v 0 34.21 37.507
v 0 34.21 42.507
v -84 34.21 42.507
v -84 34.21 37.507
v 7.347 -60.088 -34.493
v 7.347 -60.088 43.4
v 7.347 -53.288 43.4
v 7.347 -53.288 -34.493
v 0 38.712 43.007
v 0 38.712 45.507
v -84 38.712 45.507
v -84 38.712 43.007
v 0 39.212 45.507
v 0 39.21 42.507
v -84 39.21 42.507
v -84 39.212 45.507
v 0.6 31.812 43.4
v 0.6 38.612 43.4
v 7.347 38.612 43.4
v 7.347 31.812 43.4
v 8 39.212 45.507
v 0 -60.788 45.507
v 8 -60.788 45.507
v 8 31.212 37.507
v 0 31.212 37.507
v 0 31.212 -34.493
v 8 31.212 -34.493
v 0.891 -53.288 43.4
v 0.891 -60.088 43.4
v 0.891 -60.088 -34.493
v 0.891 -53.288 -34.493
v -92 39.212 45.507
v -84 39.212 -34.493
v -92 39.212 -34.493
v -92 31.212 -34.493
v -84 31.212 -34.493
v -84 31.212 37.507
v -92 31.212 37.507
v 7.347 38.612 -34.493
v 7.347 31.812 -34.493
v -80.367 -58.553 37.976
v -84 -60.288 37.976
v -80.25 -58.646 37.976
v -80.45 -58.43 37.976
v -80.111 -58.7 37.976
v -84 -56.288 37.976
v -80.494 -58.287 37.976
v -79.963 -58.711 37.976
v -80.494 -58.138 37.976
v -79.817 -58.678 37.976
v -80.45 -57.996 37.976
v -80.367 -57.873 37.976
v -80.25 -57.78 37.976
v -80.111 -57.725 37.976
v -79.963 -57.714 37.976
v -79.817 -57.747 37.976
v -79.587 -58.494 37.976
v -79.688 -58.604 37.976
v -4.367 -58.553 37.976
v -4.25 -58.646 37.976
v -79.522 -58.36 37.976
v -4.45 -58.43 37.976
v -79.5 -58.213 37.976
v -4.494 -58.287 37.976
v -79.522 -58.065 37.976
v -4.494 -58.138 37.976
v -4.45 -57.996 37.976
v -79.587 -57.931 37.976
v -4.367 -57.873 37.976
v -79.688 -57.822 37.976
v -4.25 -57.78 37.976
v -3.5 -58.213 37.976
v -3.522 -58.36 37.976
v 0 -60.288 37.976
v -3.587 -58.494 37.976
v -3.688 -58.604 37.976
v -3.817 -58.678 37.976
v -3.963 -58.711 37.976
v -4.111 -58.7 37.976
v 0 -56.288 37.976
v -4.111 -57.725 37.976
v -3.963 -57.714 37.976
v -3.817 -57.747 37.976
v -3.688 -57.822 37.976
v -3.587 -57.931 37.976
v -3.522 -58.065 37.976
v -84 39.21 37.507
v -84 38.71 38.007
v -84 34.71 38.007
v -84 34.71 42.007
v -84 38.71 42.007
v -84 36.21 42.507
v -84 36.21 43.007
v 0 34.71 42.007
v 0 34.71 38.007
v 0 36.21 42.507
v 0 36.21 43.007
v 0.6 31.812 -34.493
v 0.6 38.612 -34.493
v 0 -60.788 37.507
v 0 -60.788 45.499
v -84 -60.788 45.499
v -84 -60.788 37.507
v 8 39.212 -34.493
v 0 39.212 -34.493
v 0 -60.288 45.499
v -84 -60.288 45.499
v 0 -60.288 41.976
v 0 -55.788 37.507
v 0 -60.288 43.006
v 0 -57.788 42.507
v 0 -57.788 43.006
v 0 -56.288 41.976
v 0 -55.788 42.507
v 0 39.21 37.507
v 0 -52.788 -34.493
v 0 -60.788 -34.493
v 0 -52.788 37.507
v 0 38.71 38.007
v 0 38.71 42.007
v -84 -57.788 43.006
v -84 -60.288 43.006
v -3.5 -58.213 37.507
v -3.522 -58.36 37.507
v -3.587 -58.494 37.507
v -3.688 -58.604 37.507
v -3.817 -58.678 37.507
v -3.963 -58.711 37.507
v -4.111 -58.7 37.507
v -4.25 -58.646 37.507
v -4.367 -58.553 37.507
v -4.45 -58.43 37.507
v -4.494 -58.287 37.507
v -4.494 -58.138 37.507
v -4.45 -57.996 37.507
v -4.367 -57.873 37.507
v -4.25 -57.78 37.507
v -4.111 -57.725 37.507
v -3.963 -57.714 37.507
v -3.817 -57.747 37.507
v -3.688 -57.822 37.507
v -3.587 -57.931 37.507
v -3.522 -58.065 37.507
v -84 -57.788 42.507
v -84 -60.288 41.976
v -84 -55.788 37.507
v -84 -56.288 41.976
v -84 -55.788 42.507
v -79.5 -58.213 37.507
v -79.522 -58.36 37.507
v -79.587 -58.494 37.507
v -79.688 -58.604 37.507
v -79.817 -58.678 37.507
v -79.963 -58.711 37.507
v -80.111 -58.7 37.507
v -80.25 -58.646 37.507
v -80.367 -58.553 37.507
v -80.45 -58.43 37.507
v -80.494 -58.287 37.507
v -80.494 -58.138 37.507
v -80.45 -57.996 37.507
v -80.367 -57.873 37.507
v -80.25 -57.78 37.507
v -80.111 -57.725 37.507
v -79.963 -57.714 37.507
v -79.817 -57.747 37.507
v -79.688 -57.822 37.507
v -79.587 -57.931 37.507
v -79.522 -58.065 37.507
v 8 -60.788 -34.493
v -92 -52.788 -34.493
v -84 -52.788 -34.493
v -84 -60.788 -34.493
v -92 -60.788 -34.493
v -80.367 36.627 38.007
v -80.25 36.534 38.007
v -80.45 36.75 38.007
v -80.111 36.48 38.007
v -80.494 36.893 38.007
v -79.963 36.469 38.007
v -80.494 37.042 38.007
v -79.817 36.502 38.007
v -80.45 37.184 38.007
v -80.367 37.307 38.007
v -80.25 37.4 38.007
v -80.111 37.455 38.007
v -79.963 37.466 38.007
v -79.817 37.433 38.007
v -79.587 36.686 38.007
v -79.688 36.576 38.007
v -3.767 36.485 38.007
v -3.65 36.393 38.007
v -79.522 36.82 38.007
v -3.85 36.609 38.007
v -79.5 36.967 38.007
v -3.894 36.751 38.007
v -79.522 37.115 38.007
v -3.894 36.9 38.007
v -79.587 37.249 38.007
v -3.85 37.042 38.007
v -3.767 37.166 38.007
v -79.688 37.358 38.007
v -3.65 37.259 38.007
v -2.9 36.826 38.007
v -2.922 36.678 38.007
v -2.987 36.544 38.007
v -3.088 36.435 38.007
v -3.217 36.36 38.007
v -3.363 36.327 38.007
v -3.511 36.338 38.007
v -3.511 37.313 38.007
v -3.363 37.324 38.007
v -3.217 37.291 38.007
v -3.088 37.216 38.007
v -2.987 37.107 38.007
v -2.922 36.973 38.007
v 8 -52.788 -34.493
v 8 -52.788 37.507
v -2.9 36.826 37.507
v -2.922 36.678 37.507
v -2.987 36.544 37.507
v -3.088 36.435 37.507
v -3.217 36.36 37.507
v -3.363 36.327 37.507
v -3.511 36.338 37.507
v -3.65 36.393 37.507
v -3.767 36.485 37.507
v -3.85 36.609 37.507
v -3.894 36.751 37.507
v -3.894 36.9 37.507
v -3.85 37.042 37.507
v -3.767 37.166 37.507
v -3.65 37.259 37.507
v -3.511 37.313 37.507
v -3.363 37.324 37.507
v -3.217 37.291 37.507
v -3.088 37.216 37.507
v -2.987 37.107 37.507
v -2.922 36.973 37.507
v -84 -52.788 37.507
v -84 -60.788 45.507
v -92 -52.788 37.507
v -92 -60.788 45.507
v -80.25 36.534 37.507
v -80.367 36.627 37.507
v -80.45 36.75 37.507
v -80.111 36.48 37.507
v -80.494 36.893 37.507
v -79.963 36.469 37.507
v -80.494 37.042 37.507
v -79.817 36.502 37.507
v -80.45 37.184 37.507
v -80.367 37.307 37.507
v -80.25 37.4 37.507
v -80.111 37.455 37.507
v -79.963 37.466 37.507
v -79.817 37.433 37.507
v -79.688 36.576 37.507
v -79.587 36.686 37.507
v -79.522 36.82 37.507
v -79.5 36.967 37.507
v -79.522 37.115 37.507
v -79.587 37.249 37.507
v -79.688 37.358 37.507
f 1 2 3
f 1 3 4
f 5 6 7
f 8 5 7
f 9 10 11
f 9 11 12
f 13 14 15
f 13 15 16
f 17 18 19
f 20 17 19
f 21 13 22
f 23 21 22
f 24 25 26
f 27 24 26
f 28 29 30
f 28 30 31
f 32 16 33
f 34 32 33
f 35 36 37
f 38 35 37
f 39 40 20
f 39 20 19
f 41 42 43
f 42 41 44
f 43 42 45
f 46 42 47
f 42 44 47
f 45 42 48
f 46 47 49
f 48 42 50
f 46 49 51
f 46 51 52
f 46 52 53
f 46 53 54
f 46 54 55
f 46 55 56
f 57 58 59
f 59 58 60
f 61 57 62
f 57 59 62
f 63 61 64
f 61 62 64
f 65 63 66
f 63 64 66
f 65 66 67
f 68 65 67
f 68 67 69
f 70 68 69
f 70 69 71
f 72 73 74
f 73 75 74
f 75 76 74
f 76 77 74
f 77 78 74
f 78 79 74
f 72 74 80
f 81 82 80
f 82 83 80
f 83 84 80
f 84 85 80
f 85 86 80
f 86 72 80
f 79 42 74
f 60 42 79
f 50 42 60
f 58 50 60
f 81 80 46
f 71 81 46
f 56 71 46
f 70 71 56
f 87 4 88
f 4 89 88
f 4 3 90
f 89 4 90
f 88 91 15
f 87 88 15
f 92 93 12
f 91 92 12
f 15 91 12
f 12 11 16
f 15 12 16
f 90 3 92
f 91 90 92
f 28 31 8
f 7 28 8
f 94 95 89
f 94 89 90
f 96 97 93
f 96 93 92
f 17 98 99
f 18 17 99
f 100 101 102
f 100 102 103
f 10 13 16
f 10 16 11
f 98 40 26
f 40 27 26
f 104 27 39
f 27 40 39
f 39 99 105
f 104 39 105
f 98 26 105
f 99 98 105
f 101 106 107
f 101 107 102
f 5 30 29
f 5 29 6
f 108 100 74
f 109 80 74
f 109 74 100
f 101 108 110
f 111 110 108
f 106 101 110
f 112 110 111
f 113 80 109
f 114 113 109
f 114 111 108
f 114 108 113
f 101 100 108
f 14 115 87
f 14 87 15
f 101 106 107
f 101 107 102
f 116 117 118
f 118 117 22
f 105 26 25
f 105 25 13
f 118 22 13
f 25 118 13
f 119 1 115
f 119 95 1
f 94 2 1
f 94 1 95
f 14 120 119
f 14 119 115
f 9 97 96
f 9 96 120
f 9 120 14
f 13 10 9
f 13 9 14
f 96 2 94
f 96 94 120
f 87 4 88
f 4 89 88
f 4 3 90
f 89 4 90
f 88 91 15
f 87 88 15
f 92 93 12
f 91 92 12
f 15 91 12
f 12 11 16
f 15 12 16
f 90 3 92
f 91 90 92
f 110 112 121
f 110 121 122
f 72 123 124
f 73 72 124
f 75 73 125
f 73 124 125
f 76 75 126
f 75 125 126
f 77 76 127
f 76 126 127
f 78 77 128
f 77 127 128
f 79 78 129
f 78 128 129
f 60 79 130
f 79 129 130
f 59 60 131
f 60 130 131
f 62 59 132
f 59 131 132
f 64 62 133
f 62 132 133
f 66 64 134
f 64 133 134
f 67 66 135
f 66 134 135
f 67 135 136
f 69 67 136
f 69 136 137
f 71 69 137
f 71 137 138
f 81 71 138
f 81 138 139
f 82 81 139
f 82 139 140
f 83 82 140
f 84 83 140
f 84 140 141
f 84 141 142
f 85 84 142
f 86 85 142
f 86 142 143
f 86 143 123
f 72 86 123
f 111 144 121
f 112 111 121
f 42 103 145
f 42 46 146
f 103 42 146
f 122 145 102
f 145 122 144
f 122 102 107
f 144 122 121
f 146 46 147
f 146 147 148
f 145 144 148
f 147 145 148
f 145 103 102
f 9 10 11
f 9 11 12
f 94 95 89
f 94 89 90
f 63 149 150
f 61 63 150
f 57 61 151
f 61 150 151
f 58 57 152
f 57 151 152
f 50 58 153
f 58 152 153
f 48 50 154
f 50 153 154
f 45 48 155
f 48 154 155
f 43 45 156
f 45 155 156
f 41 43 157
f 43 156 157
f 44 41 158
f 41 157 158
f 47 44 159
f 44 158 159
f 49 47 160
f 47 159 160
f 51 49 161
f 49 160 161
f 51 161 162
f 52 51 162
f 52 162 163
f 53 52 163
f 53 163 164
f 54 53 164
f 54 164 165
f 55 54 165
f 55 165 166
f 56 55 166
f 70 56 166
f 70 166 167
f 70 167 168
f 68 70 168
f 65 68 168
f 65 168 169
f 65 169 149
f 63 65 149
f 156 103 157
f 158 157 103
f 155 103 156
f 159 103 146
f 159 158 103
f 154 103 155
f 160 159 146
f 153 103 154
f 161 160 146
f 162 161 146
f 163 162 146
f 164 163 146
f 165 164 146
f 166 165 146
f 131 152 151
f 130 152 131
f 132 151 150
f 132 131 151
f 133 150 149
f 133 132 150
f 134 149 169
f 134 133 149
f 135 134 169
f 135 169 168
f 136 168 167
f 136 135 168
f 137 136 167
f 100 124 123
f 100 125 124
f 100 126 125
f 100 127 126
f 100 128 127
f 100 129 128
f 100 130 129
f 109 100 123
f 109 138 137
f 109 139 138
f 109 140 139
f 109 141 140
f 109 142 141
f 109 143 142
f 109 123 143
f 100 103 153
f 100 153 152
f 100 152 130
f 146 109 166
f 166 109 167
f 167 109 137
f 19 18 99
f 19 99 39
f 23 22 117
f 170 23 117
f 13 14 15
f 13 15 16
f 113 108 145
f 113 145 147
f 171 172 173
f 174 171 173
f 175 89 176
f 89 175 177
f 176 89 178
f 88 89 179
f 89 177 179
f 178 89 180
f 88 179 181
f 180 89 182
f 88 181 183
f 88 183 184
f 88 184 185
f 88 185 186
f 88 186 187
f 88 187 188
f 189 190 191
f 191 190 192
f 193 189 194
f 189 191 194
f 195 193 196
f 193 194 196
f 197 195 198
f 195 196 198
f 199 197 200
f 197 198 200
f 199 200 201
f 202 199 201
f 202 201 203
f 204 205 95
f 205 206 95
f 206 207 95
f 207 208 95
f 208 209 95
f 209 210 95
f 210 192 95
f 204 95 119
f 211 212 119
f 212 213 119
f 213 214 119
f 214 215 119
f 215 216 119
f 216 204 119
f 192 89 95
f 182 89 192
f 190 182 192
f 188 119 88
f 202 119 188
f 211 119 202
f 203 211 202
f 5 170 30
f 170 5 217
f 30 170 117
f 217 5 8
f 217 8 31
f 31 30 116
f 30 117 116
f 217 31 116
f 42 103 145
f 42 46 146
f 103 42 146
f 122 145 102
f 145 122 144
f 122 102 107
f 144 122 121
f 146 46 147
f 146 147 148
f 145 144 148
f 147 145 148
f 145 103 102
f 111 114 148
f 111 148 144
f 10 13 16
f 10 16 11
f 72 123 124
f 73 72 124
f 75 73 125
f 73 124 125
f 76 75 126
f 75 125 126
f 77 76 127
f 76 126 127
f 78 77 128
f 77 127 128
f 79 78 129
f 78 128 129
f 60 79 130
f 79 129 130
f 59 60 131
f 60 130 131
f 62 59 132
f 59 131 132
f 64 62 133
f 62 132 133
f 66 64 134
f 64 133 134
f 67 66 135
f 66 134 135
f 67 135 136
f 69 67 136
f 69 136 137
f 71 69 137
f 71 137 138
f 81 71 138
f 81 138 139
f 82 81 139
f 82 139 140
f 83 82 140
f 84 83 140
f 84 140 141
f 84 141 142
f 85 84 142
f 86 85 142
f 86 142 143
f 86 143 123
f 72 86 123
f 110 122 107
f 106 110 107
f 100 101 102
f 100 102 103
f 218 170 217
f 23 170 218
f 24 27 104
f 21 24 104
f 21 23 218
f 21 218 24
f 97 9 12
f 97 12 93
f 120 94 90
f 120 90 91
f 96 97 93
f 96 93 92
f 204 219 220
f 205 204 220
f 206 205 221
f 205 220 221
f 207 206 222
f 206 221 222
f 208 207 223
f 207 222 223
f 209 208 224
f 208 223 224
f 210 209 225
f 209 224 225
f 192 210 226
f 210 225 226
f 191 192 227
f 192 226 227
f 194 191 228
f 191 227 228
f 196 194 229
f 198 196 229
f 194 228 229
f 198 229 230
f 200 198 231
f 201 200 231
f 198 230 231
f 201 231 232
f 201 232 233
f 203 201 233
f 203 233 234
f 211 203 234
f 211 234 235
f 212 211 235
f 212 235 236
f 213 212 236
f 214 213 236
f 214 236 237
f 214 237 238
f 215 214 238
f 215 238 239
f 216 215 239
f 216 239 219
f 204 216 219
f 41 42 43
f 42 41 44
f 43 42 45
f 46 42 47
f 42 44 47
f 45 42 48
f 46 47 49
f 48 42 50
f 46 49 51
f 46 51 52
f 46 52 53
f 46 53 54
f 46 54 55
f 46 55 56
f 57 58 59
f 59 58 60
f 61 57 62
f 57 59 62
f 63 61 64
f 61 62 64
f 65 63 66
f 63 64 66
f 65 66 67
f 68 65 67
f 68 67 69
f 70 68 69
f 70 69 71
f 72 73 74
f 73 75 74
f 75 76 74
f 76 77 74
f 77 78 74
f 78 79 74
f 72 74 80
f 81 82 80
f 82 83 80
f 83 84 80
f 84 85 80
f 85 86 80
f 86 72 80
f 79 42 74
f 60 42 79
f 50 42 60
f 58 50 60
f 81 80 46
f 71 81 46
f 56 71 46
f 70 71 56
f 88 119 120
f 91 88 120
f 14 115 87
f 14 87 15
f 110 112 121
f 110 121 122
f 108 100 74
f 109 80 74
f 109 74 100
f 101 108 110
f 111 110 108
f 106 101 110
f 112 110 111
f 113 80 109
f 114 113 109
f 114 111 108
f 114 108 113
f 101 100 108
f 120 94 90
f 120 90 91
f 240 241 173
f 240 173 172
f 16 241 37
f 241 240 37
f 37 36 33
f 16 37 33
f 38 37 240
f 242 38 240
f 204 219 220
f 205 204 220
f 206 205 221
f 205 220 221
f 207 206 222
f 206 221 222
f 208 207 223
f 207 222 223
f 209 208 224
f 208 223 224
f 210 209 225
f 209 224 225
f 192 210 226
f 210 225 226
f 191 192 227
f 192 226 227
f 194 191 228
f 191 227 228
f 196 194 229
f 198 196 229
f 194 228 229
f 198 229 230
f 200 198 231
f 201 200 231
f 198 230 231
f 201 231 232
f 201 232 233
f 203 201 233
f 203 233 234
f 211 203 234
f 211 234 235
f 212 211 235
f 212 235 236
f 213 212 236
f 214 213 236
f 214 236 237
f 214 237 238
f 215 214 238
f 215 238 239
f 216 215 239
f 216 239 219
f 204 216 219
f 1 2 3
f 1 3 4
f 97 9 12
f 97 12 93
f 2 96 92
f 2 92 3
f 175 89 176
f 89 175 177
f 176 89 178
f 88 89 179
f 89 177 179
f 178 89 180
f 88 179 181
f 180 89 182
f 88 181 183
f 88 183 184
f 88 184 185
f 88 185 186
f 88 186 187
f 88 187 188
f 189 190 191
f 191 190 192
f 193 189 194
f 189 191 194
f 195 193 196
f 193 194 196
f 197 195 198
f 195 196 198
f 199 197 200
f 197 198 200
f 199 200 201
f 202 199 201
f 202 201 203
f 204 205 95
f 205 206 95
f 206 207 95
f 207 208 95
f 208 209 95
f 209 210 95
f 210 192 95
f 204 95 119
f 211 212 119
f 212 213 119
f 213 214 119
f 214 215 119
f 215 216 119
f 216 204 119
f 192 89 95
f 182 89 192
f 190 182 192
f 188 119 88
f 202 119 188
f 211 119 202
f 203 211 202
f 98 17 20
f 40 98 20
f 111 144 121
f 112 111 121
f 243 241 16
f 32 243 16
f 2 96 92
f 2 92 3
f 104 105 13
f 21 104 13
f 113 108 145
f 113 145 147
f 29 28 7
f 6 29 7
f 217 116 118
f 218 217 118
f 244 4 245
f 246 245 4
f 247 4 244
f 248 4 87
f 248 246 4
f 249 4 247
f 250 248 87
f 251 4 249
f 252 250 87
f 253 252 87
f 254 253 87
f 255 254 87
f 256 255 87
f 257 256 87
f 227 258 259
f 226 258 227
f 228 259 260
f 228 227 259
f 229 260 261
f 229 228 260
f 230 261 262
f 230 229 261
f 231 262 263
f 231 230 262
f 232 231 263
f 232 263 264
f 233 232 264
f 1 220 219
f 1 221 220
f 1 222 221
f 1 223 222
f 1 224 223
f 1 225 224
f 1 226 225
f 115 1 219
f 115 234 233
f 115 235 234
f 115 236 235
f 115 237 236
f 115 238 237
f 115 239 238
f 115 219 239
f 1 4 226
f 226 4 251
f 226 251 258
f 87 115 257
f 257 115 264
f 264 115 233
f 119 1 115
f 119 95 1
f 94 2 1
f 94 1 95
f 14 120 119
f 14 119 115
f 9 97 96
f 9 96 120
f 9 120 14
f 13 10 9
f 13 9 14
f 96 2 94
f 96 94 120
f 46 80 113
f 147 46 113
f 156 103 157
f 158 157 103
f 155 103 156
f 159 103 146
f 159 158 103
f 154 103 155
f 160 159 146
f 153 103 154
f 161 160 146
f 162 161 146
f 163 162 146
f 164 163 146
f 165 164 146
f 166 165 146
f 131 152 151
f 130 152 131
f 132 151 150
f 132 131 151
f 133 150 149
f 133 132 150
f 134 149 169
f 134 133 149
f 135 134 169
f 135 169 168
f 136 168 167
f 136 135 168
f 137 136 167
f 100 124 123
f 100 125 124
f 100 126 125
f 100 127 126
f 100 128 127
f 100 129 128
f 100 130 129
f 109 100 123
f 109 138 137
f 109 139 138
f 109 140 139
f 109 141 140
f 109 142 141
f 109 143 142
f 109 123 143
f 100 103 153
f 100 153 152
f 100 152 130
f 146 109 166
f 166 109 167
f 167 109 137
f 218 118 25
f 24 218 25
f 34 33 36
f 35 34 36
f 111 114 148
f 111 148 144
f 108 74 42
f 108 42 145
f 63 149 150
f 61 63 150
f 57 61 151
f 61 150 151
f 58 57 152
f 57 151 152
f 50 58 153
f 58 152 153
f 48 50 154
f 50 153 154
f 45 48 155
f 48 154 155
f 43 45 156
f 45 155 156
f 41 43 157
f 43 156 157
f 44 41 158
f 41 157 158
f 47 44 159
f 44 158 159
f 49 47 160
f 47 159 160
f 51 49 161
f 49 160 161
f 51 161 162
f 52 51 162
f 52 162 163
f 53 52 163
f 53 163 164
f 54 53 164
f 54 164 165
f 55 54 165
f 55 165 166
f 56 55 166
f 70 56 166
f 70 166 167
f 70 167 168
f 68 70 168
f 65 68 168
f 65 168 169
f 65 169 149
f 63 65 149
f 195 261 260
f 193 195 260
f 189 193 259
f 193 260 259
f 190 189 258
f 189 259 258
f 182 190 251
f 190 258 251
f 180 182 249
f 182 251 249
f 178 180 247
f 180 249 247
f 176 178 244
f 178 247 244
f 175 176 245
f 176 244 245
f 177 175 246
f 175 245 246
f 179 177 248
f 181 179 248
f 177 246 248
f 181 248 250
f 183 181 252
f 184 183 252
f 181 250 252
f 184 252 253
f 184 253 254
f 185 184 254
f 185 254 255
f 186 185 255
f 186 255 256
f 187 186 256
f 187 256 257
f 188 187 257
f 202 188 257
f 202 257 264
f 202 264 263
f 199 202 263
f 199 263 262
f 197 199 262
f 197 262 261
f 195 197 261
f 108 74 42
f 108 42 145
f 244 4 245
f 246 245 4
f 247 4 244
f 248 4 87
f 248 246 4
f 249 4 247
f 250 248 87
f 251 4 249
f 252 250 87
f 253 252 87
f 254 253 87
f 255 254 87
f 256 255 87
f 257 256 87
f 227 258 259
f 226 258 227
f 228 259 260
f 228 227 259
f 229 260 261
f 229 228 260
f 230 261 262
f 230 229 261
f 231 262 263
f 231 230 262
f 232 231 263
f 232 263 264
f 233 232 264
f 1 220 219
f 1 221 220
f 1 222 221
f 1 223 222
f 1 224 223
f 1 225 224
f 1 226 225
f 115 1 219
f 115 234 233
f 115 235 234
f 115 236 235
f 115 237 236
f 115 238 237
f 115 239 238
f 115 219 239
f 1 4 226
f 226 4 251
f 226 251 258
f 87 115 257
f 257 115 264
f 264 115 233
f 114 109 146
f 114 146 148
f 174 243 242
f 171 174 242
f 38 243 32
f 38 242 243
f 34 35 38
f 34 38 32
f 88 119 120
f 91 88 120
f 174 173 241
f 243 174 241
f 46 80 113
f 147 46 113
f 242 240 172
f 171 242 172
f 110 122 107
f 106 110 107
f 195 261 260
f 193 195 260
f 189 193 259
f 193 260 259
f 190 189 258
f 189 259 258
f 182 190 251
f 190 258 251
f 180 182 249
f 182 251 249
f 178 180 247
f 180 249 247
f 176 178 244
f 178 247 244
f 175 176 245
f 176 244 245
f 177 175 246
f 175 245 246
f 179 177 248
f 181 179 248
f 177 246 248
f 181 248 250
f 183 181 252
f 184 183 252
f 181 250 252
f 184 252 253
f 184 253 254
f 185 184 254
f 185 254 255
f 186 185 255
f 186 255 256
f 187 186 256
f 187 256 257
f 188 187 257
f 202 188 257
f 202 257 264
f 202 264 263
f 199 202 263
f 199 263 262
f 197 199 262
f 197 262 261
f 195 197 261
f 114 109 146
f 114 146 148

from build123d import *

# Parameters (mm, degrees)
F1_DEPTH = 8
F2_W     = 6.4551721394
F2_H     = 6.8
F2_W_2   = 6.7465151047
F3_DEPTH = 43.4
F4_W     = 4
F4_H     = 4
F5_DEPTH = 84
F6_DEPTH = 84
F7_START = 84
F7_DEPTH = 8
F8_R     = 0.5
F9_DEPTH = 4.1


with BuildPart() as f1:
    # F0 (on Right) → F1 (new body)
    with BuildSketch(Plane.YZ):
        Polygon((-60.7876732945, 45.5071360877), (-60.7876732945, -34.4928639123), (-52.7876732945, -34.4928639123), (-52.7876732945, 37.5071360877), (31.2123267055, 37.5071360877), (31.2123267055, -34.4928639123), (39.2123267055, -34.4928639123), (39.2123267055, 45.5071360877), align=None)
    extrude(amount=F1_DEPTH)

    # F2 (on Top) → F3 (cut, symmetric)
    with BuildSketch(Plane.XY):
        with Locations((4.118929035, -56.6876732945)):
            Rectangle(F2_W, F2_H)
        with Locations((3.9732575524, 35.2123267055)):
            Rectangle(F2_W_2, F2_H)
    extrude(amount=F3_DEPTH, both=True, mode=Mode.SUBTRACT)


with BuildPart() as f5:
    # F4 (on Right) → F5 (new body)
    with BuildSketch(Plane.YZ):
        Polygon((39.2096609688, 37.5071360877), (39.2096609688, 42.5071360877), (36.2096609688, 42.5071360877), (34.2096609688, 42.5071360877), (34.2096609688, 37.5071360877), align=None)
        with Locations((36.7096609688, 40.0071360877)):
            Rectangle(F4_W, F4_H, mode=Mode.SUBTRACT)
        Polygon((36.2096609688, 42.5071360877), (39.2096609688, 42.5071360877), (39.2123267055, 45.5071349033), (38.7123267055, 45.5071349033), (38.7123267055, 43.0071360877), (36.2096609688, 43.0071360877), align=None)
    extrude(amount=-F5_DEPTH)


with BuildPart() as f5b:
    # F4 (on Right) → F5, piece 2 (new body)
    with BuildSketch(Plane.YZ):
        Polygon((-55.7876732945, 37.5071360877), (-55.7876732945, 42.5071360877), (-57.7876734523, 42.5071360877), (-57.7876734523, 42.5061632327), (-60.7876732945, 42.5071360877), (-60.7876732945, 37.5071360877), align=None)
        with Locations((-58.2876732945, 39.9762127995)):
            Rectangle(F4_W, F4_H, mode=Mode.SUBTRACT)
        Polygon((-57.7876734523, 42.5061632327), (-57.7876734523, 42.5071360877), (-60.7876732945, 42.5071360877), align=None)
        Polygon((-60.7876732945, 42.5071360877), (-57.7876734523, 42.5071360877), (-57.7876734523, 43.0061632327), (-60.2876732945, 43.0061632327), (-60.2876732945, 45.4994887114), (-60.7876732945, 45.4994887114), align=None)
    extrude(amount=-F5_DEPTH)


with BuildPart() as f6:
    # F4 (on Right) → F6 (new body)
    with BuildSketch(Plane.YZ):
        Polygon((39.2096609688, 37.5071360877), (39.2096609688, 42.5071360877), (36.2096609688, 42.5071360877), (34.2096609688, 42.5071360877), (34.2096609688, 37.5071360877), align=None)
        with Locations((36.7096609688, 40.0071360877)):
            Rectangle(F4_W, F4_H, mode=Mode.SUBTRACT)
        Polygon((36.2096609688, 42.5071360877), (39.2096609688, 42.5071360877), (39.2123267055, 45.5071349033), (38.7123267055, 45.5071349033), (38.7123267055, 43.0071360877), (36.2096609688, 43.0071360877), align=None)
    extrude(amount=-F6_DEPTH)


with BuildPart() as f6b:
    # F4 (on Right) → F6, piece 2 (new body)
    with BuildSketch(Plane.YZ):
        Polygon((-55.7876732945, 37.5071360877), (-55.7876732945, 42.5071360877), (-57.7876734523, 42.5071360877), (-57.7876734523, 42.5061632327), (-60.7876732945, 42.5071360877), (-60.7876732945, 37.5071360877), align=None)
        with Locations((-58.2876732945, 39.9762127995)):
            Rectangle(F4_W, F4_H, mode=Mode.SUBTRACT)
        Polygon((-57.7876734523, 42.5061632327), (-57.7876734523, 42.5071360877), (-60.7876732945, 42.5071360877), align=None)
        Polygon((-60.7876732945, 42.5071360877), (-57.7876734523, 42.5071360877), (-57.7876734523, 43.0061632327), (-60.2876732945, 43.0061632327), (-60.2876732945, 45.4994887114), (-60.7876732945, 45.4994887114), align=None)
    extrude(amount=-F6_DEPTH)


with BuildPart() as f7:
    # F1_face (on face) → F7 (new body)
    with BuildSketch(Plane(origin=(0, -10.7876732945, 17.9005787106), x_dir=(0, 1, 0), z_dir=(-1, 0, 0)).offset(F7_START)):
        Polygon((-50, 52.393442623), (-50, -27.606557377), (50, -27.606557377), (50, 52.393442623), (42, 52.393442623), (42, -19.606557377), (-42, -19.606557377), (-42, 52.393442623), align=None)
    extrude(amount=F7_DEPTH)


with BuildPart() as f9_tool:
    # F8 (on face) → F9 (new body)
    with BuildSketch(Plane(origin=(0, 0, 37.5071360877), x_dir=(1, 0, 0), z_dir=(0, 0, -1))):
        with Locations((-80, 58.2126826048)):
            Circle(F8_R)
        with Locations((-4, 58.2126826048)):
            Circle(F8_R)
        with Locations((-3.4, -36.8255414069)):
            Circle(F8_R)
        with Locations((-80, -36.967176944)):
            Circle(F8_R)
    extrude(amount=-F9_DEPTH)


with BuildPart() as f5_1:
    add(f5.part)

    # F9: cut by f9_tool
    add(f9_tool.part, mode=Mode.SUBTRACT)


with BuildPart() as f5b_1:
    add(f5b.part)

    # F9: cut by f9_tool
    add(f9_tool.part, mode=Mode.SUBTRACT)


with BuildPart() as f6_1:
    add(f6.part)

    # F9: cut by f9_tool
    add(f9_tool.part, mode=Mode.SUBTRACT)


with BuildPart() as f6b_1:
    add(f6b.part)

    # F9: cut by f9_tool
    add(f9_tool.part, mode=Mode.SUBTRACT)


solid = Compound([f1.part, f7.part, f5_1.part, f5b_1.part, f6_1.part, f6b_1.part])
